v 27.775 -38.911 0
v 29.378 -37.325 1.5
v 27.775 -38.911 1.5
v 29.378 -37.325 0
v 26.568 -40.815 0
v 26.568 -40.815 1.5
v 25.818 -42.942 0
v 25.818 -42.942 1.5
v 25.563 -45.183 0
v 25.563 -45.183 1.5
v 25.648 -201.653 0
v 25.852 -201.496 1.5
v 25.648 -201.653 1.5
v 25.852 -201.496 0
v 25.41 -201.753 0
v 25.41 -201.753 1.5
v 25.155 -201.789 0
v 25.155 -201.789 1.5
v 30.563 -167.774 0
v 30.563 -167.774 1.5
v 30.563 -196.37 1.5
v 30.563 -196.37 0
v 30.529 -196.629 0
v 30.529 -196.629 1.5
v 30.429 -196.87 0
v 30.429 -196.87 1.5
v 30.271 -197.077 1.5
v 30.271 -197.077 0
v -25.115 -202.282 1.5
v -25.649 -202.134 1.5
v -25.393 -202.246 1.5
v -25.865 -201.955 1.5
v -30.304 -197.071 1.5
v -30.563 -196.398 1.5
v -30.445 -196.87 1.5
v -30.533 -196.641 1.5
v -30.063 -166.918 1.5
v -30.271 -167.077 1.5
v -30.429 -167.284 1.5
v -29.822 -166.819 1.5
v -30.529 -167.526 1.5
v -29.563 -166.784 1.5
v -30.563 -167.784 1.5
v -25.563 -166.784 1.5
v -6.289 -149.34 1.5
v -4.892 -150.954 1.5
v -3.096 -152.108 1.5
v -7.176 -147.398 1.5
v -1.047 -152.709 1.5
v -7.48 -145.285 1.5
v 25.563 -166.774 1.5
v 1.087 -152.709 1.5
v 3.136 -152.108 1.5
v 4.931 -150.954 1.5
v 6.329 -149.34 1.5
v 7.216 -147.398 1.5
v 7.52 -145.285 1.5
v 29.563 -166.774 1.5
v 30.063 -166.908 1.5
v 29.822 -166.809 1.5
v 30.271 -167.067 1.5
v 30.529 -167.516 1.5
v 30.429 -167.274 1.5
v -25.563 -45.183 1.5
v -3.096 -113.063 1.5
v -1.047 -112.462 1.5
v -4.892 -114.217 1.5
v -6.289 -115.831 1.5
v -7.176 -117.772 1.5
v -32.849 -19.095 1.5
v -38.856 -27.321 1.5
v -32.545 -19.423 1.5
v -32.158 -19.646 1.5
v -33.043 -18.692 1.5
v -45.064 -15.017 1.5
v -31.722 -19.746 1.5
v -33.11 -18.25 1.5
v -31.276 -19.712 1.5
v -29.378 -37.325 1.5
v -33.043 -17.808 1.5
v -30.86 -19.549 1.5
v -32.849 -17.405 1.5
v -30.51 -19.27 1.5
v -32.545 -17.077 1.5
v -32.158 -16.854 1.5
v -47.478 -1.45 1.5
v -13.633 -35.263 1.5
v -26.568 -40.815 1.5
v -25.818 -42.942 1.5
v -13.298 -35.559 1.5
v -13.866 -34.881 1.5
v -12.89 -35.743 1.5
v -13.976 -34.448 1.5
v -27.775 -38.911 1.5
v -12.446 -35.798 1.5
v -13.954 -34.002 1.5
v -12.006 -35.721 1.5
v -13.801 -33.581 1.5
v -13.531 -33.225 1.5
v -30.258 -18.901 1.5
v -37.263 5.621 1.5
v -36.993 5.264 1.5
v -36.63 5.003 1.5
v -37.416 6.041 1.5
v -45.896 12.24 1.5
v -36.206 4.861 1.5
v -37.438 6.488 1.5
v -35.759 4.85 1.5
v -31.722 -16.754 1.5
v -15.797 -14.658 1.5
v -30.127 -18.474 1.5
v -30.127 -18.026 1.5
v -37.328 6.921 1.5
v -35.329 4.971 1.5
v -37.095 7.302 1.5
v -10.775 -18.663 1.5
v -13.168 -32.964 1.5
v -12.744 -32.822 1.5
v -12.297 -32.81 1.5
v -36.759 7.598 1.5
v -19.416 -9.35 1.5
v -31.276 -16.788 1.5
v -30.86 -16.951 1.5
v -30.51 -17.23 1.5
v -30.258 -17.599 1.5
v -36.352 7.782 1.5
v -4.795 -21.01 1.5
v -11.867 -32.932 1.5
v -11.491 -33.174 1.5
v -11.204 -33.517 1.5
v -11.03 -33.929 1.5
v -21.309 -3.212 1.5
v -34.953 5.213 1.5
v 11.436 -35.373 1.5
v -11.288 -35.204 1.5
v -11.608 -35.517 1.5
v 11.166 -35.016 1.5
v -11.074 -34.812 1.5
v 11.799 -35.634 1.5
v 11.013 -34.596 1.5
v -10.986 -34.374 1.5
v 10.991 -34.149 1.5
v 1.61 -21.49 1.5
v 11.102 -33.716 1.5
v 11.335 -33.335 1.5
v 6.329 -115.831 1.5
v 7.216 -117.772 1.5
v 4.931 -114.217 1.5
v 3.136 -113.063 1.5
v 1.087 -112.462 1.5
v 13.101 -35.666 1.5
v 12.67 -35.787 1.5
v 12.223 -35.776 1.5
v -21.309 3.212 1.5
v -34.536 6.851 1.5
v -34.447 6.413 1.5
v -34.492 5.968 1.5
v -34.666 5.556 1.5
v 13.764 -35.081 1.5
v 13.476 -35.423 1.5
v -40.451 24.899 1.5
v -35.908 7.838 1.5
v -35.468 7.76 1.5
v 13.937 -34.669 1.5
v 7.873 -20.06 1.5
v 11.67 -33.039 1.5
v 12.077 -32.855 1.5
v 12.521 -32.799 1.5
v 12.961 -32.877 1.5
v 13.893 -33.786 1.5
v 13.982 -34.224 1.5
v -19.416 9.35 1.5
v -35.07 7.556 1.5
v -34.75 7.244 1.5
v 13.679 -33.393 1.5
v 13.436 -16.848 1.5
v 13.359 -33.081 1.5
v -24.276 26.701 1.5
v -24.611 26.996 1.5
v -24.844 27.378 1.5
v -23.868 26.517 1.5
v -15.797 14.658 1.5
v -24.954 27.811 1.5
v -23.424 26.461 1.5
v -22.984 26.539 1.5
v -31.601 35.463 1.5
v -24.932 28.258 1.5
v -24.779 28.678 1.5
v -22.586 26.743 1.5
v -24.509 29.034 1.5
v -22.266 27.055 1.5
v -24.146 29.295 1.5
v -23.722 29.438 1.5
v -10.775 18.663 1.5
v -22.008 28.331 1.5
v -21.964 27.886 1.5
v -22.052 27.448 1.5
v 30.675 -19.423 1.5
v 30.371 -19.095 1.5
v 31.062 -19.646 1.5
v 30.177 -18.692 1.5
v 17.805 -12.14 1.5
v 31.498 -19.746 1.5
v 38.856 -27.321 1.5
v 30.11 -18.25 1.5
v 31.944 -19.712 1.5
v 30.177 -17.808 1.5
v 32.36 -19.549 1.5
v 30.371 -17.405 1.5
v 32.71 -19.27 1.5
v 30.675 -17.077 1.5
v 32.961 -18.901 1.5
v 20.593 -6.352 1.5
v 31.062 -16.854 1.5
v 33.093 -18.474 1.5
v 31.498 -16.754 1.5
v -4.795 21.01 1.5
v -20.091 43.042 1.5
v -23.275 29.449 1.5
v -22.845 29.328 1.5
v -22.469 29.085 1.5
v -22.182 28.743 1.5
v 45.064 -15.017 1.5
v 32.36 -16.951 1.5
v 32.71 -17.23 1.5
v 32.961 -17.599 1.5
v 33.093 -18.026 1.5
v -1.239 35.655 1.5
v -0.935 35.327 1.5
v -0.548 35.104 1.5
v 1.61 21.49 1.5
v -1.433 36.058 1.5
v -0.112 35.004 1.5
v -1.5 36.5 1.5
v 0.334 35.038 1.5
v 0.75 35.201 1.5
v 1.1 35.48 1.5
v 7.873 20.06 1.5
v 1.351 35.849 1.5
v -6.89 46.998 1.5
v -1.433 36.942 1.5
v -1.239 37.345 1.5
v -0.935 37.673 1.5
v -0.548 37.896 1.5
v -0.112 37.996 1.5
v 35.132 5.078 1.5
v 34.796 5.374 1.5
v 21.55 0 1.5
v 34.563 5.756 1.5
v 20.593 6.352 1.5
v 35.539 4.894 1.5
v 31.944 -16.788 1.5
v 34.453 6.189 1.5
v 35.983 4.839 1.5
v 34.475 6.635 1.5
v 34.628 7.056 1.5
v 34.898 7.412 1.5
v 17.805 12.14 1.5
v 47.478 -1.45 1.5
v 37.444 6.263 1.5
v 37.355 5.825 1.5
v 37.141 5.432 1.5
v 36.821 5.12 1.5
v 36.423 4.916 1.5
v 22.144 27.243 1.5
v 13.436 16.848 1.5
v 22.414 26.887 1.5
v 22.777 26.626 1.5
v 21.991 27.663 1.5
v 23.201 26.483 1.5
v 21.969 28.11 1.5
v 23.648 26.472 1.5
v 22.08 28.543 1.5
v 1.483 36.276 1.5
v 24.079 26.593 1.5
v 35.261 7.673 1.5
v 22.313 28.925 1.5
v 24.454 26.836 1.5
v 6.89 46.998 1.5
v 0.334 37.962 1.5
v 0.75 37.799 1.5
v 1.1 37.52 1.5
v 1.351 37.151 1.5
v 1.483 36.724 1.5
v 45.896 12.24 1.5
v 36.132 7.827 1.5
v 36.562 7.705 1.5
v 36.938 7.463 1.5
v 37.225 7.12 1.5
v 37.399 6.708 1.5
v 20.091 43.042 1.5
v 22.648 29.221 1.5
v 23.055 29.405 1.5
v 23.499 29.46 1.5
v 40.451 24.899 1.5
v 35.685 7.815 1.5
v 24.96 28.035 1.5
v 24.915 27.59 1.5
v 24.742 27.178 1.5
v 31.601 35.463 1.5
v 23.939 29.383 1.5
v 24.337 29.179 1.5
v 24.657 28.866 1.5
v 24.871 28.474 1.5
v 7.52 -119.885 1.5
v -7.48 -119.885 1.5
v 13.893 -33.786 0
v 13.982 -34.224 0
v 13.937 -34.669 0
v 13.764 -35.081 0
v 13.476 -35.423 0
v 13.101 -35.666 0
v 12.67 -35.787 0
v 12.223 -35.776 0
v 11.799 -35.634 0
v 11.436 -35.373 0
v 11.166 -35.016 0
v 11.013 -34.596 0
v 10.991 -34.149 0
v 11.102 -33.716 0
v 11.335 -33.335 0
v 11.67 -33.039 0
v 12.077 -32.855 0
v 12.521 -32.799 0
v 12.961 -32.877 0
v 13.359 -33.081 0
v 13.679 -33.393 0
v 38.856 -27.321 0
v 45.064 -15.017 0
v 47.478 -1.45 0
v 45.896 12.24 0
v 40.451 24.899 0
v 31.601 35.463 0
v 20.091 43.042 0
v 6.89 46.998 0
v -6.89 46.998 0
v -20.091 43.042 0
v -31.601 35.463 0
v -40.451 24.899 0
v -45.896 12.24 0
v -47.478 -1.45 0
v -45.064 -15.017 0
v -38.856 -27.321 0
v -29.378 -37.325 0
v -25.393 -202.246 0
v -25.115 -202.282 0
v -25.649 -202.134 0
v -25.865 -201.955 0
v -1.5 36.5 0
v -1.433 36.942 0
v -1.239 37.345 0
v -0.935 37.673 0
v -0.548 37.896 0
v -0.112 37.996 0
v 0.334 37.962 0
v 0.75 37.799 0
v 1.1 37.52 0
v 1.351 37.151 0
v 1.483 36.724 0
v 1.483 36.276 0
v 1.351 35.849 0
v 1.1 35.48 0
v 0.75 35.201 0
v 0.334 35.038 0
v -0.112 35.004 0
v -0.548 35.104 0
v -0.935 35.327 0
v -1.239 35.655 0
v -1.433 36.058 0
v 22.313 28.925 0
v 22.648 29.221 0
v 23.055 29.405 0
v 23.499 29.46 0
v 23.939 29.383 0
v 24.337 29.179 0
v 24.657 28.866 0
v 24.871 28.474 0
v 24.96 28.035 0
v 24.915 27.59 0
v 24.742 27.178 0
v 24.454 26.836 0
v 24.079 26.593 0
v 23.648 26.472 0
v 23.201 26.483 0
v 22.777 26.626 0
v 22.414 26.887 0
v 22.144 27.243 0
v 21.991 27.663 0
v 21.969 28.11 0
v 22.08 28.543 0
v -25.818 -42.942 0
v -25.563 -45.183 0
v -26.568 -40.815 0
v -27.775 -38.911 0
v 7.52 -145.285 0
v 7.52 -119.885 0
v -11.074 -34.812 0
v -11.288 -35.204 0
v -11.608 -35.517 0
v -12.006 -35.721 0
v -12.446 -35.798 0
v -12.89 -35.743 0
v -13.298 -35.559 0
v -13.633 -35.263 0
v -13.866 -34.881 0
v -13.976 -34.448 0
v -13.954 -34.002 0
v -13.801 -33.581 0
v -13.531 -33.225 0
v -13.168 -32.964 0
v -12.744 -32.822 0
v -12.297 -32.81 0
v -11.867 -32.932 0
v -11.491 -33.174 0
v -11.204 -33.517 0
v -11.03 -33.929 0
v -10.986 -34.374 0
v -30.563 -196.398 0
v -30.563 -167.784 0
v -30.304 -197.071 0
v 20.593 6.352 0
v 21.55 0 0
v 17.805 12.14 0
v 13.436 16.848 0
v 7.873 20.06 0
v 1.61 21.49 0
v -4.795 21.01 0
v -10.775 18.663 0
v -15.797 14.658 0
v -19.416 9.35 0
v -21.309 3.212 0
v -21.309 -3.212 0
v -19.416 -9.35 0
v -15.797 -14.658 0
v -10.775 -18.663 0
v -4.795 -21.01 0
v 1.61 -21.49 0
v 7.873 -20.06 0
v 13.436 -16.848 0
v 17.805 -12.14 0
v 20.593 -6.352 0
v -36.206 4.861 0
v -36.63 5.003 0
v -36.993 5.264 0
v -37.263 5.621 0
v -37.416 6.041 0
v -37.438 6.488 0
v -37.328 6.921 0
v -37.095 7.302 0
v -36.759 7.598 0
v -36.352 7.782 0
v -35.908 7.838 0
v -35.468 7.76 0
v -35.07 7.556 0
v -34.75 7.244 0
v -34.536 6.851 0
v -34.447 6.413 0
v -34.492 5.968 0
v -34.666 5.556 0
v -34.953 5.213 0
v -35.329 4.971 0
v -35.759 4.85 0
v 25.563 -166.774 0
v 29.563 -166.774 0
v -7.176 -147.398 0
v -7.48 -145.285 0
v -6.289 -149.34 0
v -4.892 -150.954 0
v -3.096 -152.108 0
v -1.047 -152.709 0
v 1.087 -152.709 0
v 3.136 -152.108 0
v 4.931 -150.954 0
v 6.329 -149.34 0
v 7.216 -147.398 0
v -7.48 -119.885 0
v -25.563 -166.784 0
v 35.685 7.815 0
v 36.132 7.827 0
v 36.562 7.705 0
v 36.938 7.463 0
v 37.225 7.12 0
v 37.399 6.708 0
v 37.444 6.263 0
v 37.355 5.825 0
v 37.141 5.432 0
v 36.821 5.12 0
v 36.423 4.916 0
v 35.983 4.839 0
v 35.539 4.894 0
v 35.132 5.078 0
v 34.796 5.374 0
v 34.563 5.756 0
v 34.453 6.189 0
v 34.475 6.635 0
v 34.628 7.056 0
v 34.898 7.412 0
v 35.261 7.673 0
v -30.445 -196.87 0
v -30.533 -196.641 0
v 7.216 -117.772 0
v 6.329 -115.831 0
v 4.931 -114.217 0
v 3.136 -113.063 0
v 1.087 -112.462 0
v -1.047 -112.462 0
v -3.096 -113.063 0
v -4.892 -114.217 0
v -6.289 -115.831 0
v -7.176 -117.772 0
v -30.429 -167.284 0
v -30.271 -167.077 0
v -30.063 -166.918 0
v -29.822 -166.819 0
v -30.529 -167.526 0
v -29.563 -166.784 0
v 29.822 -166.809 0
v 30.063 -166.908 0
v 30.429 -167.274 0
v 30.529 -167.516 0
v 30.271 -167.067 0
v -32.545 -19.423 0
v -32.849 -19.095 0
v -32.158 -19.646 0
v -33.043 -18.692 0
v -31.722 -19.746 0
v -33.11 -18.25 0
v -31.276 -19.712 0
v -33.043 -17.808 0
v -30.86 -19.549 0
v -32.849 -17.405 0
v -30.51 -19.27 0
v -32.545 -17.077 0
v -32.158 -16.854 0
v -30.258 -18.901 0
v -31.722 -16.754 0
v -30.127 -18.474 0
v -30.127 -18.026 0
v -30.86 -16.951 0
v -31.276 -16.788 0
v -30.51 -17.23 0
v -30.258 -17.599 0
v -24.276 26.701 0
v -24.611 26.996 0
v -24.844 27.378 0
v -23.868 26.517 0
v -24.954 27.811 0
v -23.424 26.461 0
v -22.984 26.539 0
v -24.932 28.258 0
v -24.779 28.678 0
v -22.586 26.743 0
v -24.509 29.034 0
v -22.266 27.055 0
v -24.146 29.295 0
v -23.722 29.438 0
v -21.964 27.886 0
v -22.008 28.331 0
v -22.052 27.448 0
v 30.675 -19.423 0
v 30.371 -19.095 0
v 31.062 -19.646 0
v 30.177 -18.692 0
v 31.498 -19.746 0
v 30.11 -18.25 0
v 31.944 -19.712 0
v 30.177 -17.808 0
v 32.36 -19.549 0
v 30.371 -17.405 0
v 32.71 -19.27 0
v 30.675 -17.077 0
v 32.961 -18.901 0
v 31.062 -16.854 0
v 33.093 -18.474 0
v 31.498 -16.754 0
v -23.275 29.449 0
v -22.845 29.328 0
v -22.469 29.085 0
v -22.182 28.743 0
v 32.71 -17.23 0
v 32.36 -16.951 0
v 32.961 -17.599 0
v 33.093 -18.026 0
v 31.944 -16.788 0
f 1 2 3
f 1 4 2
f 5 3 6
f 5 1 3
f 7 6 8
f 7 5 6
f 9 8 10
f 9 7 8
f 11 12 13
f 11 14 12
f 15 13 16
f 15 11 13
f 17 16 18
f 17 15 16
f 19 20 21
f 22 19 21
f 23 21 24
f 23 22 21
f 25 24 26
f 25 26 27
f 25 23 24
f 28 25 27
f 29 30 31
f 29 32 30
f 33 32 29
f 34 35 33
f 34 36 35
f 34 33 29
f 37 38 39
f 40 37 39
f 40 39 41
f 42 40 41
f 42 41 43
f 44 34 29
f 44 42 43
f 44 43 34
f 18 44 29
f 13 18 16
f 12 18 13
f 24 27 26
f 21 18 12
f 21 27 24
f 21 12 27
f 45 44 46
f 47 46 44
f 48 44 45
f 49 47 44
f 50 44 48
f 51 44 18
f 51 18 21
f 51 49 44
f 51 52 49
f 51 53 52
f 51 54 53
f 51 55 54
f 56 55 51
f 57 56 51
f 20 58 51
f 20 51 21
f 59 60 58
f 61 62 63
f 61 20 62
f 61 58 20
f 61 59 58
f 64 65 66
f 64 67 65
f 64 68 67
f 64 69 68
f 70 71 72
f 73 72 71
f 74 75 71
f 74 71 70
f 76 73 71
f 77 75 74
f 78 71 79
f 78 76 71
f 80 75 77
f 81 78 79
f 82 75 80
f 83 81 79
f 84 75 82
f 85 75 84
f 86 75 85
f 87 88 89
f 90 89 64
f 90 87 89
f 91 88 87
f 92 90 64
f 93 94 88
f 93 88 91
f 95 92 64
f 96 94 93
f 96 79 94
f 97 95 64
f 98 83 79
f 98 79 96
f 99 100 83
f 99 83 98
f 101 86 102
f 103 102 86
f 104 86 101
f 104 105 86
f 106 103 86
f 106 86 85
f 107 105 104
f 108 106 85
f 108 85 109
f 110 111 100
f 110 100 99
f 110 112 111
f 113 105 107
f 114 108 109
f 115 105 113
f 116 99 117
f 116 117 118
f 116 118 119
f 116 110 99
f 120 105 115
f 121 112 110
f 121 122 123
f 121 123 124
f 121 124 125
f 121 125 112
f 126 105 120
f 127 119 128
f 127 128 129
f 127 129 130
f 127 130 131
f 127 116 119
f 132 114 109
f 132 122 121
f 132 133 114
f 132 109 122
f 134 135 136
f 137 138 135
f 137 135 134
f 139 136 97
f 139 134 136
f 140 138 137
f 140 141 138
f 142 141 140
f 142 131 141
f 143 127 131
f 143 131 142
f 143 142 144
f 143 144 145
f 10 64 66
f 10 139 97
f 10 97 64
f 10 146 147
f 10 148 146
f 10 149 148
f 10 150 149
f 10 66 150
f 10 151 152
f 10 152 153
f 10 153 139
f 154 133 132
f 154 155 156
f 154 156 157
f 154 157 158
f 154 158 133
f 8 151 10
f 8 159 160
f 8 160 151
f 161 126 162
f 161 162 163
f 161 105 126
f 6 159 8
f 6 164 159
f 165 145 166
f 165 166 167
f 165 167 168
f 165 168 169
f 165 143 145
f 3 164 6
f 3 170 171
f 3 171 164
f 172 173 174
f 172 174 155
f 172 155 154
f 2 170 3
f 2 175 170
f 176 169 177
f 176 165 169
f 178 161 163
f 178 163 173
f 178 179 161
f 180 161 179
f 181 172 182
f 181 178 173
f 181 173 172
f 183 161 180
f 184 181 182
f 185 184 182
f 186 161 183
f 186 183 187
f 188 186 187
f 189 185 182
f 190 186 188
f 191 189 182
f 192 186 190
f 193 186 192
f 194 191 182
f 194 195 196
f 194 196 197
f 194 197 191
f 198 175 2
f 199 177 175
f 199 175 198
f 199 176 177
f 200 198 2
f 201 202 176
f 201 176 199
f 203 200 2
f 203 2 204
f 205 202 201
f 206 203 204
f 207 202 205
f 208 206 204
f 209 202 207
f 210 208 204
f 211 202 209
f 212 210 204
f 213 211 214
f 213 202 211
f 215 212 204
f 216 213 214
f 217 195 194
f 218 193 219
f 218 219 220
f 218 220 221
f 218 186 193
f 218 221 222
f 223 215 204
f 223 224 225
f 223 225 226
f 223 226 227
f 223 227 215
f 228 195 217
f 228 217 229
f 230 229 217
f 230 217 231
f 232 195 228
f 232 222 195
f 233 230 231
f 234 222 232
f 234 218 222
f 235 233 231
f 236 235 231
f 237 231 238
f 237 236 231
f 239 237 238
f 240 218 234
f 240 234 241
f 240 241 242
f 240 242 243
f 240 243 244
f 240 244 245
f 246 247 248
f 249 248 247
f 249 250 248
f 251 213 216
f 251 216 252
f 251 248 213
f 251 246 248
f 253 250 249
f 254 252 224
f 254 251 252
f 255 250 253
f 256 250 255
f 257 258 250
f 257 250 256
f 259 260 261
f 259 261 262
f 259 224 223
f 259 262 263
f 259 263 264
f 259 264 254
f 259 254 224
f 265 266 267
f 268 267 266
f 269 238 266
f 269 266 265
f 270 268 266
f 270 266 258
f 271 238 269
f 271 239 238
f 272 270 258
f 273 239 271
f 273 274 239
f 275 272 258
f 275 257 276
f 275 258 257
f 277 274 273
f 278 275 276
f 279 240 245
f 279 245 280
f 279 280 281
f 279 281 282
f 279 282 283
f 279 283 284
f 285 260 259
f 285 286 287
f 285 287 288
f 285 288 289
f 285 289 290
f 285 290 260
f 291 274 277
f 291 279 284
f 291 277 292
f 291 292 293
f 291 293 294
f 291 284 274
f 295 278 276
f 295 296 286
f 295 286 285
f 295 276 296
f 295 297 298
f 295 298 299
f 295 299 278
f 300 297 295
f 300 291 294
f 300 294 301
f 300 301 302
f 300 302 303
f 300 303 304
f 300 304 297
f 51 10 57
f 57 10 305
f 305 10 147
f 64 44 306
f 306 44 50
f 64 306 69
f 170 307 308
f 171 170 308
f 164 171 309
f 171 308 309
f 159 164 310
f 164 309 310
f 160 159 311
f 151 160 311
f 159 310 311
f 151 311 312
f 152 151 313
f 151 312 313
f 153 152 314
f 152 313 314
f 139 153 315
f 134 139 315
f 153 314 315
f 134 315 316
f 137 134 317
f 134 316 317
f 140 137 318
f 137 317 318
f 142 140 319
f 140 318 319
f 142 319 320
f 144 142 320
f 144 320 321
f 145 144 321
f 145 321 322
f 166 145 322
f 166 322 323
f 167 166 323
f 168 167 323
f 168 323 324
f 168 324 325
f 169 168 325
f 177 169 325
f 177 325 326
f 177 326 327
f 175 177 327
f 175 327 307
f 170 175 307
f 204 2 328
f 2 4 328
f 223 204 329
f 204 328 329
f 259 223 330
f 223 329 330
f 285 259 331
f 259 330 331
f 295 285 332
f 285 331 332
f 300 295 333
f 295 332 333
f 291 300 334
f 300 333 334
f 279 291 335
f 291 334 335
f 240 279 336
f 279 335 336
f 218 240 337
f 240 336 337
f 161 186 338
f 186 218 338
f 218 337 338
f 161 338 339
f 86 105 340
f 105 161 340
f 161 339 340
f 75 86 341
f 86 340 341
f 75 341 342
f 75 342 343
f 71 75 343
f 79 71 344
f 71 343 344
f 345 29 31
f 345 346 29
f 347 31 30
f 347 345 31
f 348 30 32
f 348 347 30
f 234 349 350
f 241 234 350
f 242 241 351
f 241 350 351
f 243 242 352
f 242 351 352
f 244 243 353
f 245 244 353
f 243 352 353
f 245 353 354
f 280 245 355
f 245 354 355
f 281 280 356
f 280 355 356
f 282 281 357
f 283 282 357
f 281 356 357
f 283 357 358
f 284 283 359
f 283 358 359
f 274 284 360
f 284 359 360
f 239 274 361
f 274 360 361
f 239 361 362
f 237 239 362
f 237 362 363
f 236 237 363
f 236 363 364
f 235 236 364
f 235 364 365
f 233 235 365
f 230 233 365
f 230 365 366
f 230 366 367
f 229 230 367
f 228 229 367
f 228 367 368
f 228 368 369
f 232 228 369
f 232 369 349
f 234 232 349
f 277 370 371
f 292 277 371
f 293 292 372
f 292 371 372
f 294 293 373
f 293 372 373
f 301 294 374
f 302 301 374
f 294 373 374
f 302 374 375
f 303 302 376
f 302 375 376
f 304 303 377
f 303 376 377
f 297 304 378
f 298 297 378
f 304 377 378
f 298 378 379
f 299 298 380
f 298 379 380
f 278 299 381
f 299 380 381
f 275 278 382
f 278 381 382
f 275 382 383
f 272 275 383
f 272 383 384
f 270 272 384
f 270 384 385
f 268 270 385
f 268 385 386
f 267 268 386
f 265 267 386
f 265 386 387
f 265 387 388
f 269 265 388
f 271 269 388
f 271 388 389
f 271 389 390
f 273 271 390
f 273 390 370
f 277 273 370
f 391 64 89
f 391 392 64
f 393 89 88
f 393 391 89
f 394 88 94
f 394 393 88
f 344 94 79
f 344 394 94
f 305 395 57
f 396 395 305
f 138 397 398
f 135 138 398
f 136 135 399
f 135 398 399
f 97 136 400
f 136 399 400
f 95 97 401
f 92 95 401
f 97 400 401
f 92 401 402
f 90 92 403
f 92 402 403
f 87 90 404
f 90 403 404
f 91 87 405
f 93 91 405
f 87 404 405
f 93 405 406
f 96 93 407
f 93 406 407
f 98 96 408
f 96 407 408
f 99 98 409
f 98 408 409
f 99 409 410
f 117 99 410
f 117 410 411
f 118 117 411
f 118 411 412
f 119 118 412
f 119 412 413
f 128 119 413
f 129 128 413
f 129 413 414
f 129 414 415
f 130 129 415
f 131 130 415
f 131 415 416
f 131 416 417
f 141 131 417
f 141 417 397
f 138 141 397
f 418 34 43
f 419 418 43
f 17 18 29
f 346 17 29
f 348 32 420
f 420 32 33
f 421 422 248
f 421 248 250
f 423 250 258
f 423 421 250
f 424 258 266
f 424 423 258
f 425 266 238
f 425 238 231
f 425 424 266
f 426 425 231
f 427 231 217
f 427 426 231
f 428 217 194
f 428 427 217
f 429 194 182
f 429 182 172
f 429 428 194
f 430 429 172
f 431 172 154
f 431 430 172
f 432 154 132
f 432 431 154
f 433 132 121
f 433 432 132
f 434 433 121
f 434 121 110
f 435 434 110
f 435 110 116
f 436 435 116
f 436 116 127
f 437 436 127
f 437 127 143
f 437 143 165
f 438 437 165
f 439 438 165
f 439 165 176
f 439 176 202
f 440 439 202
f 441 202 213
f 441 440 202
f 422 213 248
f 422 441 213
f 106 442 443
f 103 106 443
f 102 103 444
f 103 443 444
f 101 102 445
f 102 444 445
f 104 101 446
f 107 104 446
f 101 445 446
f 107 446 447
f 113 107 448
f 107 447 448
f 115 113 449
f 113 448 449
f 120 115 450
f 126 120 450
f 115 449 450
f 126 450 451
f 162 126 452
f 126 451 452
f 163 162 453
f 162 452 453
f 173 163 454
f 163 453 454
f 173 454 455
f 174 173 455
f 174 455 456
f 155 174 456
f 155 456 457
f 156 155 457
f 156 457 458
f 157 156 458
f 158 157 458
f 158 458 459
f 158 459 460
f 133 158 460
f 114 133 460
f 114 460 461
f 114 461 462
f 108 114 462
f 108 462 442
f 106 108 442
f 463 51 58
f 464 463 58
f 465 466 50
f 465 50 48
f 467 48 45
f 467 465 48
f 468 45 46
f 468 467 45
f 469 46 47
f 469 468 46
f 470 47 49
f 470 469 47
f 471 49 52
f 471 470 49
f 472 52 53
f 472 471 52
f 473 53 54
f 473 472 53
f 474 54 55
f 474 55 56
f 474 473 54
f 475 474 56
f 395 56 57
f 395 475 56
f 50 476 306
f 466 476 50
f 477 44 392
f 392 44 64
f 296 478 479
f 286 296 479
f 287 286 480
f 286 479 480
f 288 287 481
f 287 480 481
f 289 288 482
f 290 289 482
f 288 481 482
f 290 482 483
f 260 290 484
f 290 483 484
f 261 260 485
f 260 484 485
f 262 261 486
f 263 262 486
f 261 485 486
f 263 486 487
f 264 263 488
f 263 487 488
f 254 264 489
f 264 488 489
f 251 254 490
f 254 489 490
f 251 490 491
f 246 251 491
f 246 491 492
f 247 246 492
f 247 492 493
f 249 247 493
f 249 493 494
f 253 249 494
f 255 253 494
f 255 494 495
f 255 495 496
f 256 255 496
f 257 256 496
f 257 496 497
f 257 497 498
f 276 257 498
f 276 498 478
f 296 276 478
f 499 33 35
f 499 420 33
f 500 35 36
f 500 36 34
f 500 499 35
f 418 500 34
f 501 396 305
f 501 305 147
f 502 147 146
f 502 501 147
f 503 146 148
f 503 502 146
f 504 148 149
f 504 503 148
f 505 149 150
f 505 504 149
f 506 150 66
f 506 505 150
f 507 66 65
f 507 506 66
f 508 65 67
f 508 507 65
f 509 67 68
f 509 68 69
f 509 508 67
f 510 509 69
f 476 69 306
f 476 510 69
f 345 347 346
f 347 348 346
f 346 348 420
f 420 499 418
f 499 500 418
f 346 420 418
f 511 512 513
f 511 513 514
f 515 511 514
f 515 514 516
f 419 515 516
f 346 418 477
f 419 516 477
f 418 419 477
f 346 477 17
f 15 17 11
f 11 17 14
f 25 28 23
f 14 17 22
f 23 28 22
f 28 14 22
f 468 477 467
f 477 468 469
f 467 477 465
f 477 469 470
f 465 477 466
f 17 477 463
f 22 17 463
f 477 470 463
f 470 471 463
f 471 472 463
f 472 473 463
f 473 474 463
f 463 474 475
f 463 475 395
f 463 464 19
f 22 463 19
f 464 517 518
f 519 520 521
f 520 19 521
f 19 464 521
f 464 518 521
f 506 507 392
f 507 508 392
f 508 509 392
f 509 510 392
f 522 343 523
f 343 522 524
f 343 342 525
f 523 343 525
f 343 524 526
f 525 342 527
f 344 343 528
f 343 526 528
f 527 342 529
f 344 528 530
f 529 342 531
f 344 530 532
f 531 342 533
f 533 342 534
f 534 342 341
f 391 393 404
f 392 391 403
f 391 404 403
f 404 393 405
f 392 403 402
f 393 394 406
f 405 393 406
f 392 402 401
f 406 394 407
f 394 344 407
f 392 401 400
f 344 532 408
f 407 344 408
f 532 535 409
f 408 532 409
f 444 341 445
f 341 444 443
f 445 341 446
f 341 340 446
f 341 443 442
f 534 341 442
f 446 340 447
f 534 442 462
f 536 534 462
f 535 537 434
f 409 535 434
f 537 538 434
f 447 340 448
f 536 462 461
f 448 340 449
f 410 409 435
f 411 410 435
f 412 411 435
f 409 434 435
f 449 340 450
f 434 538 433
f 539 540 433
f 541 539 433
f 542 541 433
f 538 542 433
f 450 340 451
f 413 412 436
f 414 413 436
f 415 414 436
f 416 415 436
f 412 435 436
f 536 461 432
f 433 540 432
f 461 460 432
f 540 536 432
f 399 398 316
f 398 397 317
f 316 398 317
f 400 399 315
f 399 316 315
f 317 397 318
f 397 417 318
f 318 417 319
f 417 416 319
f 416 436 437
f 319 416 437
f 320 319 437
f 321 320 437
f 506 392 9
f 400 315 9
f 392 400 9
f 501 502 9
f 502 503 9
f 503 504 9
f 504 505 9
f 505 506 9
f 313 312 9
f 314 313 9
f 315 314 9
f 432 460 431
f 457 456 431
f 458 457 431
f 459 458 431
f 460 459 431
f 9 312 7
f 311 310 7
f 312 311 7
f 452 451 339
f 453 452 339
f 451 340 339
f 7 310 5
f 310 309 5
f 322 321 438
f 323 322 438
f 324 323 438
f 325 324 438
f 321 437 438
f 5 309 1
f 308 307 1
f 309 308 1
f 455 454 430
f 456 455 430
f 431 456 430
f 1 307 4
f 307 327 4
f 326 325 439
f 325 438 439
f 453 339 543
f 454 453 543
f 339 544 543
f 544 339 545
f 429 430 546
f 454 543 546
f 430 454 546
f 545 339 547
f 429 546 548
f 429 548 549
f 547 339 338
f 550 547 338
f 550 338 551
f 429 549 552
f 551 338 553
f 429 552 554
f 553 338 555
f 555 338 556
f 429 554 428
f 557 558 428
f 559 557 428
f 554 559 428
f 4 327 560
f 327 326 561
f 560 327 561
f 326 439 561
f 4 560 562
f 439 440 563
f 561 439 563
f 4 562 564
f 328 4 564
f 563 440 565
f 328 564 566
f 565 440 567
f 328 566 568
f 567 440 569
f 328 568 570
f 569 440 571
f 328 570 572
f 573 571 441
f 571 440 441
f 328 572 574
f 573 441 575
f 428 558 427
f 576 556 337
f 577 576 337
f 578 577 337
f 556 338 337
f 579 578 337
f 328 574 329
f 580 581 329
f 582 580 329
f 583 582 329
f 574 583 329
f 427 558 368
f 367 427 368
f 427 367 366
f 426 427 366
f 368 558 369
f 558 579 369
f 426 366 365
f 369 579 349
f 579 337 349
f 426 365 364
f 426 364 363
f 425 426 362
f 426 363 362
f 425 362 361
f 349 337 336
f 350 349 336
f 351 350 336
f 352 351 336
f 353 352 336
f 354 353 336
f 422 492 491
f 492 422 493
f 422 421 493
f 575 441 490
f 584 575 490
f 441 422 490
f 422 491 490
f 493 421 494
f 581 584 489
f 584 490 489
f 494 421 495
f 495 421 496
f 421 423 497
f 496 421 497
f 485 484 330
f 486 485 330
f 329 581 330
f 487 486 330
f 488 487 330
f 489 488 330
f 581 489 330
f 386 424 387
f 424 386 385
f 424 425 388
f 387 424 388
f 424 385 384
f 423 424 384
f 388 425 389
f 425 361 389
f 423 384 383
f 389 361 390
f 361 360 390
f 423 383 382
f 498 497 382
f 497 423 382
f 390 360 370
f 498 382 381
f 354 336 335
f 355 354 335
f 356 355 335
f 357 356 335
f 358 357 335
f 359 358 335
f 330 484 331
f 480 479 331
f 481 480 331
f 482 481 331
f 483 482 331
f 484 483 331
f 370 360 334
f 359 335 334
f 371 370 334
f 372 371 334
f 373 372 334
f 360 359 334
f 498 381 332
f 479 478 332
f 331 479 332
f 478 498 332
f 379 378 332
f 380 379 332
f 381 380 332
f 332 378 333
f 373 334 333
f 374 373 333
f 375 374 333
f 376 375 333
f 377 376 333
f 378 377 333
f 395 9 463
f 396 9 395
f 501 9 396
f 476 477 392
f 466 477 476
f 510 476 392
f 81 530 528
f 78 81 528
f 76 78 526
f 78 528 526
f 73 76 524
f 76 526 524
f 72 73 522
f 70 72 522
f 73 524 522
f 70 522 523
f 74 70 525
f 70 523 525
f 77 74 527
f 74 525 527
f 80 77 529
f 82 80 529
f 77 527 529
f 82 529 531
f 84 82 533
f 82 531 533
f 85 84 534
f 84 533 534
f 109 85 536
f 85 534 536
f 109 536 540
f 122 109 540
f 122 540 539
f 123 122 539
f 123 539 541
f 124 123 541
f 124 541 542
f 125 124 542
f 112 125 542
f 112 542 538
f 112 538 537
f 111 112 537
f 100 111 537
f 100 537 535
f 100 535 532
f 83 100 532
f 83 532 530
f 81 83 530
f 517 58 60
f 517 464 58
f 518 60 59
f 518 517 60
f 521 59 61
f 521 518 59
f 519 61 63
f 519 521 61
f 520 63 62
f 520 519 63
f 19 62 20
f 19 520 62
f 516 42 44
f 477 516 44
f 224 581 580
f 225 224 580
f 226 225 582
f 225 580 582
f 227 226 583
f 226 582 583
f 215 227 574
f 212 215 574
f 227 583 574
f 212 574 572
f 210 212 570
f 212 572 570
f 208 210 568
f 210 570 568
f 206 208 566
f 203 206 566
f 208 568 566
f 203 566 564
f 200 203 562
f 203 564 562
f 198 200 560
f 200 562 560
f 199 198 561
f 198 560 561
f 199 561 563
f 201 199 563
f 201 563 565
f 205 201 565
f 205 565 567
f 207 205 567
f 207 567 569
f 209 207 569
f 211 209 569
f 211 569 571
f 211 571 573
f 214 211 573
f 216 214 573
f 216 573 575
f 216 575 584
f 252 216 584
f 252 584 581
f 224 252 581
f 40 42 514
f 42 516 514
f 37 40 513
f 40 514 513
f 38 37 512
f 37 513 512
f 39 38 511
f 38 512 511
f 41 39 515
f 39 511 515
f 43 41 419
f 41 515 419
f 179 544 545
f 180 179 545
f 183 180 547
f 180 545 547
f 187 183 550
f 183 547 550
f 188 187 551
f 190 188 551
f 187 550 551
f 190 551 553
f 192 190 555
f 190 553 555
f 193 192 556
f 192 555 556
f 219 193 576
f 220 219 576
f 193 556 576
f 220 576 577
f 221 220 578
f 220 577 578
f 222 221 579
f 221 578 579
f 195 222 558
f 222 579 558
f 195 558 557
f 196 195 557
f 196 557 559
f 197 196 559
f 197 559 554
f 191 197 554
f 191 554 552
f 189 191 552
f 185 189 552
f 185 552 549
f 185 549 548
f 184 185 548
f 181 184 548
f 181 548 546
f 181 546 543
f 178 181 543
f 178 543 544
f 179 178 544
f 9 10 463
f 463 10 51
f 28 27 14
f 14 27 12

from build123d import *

# Parameters (mm, degrees)
SKETCH1_R             = 47.5
SKETCH1_R_2           = 21.55
BOSS_EXTRUDE1_DEPTH   = 1.5
F_3_0MM_DOWEL_HOLE1_D = 3
CIRPATTERN1_COUNT     = 9
BOSS_EXTRUDE2_DEPTH   = 1.5
FILLET7_R             = 10
FILLET8_R             = 10
FILLET9_R             = 1
FILLET10_R            = 1
CUT_EXTRUDE2_DEPTH    = 1.5


with BuildPart() as part:
    # Sketch1 → Boss-Extrude1 (new body)
    with BuildSketch(Plane.XY):
        Circle(SKETCH1_R)
        Circle(SKETCH1_R_2, mode=Mode.SUBTRACT)
    extrude(amount=BOSS_EXTRUDE1_DEPTH)

    # Ø3.0mm Dowel Hole1 (through all)
    with Locations(Plane.XY.offset(1.5)):
        with Locations((0, 36.5)):
            f_3_0mm_dowel_hole1 = Hole(F_3_0MM_DOWEL_HOLE1_D / 2)

    # CirPattern1: Ø3.0mm Dowel Hole1 ×9 about axis
    cirpattern1_axis = Axis((0, 0, 0), (0, 0, 1))
    for i in range(1, CIRPATTERN1_COUNT):
        add(f_3_0mm_dowel_hole1.rotate(cirpattern1_axis, i * 360 / CIRPATTERN1_COUNT), mode=Mode.SUBTRACT)

    # Sketch6 → Boss-Extrude2 (add)
    with BuildSketch(Plane.XY.offset(1.5)):
        Polygon((-25.563438214, -40.034492962), (25.563438214, -40.034492962), (25.563438214, -166.774492962), (30.563438214, -166.774492962), (30.563438214, -196.784492962), (25.563438214, -201.784492962), (-25.563438214, -202.2867607), (-30.563438214, -196.784492962), (-30.563438214, -166.784492962), (-25.563438214, -166.784492962), align=None)
    extrude(amount=-BOSS_EXTRUDE2_DEPTH)

    # Fillet7
    fillet7_edges = [part.edges().sort_by_distance(p)[0] for p in [
        (-25.563438214, -40.034492962, 0.75),
    ]]
    fillet(fillet7_edges, radius=FILLET7_R)

    # Fillet8
    fillet8_edges = [part.edges().sort_by_distance(p)[0] for p in [
        (25.563438214, -40.034492962, 0.75),
    ]]
    fillet(fillet8_edges, radius=FILLET8_R)

    # Fillet9
    fillet9_edges = [part.edges().sort_by_distance(p)[0] for p in [
        (30.563438214, -166.774492962, 0.75),
        (-30.563438214, -166.784492962, 0.75),
    ]]
    fillet(fillet9_edges, radius=FILLET9_R)

    # Fillet10
    fillet10_edges = [part.edges().sort_by_distance(p)[0] for p in [
        (30.563438214, -196.784492962, 0.75),
        (25.563438214, -201.784492962, 0.75),
        (-25.563438214, -202.2867607, 0.75),
        (-30.563438214, -196.784492962, 0.75),
    ]]
    fillet(fillet10_edges, radius=FILLET10_R)

    # Sketch8 → Cut-Extrude2 (cut)
    with BuildSketch(Plane(origin=(0, 0, 0), x_dir=(-1, 0, 0), z_dir=(0, 0, -1))):
        with BuildLine():
            Line((-7.519953185, -145.285430812), (-7.519953185, -119.885430812))
            ThreePointArc((-7.519953185, -119.885430812), (-0.019953185, -112.385430812), (7.480046815, -119.885430812))
            Line((7.480046815, -119.885430812), (7.480046815, -145.285430812))
            ThreePointArc((7.480046815, -145.285430812), (-0.019953185, -152.785430812), (-7.519953185, -145.285430812))
        make_face()
    extrude(amount=-CUT_EXTRUDE2_DEPTH, mode=Mode.SUBTRACT)


solid = part.part
